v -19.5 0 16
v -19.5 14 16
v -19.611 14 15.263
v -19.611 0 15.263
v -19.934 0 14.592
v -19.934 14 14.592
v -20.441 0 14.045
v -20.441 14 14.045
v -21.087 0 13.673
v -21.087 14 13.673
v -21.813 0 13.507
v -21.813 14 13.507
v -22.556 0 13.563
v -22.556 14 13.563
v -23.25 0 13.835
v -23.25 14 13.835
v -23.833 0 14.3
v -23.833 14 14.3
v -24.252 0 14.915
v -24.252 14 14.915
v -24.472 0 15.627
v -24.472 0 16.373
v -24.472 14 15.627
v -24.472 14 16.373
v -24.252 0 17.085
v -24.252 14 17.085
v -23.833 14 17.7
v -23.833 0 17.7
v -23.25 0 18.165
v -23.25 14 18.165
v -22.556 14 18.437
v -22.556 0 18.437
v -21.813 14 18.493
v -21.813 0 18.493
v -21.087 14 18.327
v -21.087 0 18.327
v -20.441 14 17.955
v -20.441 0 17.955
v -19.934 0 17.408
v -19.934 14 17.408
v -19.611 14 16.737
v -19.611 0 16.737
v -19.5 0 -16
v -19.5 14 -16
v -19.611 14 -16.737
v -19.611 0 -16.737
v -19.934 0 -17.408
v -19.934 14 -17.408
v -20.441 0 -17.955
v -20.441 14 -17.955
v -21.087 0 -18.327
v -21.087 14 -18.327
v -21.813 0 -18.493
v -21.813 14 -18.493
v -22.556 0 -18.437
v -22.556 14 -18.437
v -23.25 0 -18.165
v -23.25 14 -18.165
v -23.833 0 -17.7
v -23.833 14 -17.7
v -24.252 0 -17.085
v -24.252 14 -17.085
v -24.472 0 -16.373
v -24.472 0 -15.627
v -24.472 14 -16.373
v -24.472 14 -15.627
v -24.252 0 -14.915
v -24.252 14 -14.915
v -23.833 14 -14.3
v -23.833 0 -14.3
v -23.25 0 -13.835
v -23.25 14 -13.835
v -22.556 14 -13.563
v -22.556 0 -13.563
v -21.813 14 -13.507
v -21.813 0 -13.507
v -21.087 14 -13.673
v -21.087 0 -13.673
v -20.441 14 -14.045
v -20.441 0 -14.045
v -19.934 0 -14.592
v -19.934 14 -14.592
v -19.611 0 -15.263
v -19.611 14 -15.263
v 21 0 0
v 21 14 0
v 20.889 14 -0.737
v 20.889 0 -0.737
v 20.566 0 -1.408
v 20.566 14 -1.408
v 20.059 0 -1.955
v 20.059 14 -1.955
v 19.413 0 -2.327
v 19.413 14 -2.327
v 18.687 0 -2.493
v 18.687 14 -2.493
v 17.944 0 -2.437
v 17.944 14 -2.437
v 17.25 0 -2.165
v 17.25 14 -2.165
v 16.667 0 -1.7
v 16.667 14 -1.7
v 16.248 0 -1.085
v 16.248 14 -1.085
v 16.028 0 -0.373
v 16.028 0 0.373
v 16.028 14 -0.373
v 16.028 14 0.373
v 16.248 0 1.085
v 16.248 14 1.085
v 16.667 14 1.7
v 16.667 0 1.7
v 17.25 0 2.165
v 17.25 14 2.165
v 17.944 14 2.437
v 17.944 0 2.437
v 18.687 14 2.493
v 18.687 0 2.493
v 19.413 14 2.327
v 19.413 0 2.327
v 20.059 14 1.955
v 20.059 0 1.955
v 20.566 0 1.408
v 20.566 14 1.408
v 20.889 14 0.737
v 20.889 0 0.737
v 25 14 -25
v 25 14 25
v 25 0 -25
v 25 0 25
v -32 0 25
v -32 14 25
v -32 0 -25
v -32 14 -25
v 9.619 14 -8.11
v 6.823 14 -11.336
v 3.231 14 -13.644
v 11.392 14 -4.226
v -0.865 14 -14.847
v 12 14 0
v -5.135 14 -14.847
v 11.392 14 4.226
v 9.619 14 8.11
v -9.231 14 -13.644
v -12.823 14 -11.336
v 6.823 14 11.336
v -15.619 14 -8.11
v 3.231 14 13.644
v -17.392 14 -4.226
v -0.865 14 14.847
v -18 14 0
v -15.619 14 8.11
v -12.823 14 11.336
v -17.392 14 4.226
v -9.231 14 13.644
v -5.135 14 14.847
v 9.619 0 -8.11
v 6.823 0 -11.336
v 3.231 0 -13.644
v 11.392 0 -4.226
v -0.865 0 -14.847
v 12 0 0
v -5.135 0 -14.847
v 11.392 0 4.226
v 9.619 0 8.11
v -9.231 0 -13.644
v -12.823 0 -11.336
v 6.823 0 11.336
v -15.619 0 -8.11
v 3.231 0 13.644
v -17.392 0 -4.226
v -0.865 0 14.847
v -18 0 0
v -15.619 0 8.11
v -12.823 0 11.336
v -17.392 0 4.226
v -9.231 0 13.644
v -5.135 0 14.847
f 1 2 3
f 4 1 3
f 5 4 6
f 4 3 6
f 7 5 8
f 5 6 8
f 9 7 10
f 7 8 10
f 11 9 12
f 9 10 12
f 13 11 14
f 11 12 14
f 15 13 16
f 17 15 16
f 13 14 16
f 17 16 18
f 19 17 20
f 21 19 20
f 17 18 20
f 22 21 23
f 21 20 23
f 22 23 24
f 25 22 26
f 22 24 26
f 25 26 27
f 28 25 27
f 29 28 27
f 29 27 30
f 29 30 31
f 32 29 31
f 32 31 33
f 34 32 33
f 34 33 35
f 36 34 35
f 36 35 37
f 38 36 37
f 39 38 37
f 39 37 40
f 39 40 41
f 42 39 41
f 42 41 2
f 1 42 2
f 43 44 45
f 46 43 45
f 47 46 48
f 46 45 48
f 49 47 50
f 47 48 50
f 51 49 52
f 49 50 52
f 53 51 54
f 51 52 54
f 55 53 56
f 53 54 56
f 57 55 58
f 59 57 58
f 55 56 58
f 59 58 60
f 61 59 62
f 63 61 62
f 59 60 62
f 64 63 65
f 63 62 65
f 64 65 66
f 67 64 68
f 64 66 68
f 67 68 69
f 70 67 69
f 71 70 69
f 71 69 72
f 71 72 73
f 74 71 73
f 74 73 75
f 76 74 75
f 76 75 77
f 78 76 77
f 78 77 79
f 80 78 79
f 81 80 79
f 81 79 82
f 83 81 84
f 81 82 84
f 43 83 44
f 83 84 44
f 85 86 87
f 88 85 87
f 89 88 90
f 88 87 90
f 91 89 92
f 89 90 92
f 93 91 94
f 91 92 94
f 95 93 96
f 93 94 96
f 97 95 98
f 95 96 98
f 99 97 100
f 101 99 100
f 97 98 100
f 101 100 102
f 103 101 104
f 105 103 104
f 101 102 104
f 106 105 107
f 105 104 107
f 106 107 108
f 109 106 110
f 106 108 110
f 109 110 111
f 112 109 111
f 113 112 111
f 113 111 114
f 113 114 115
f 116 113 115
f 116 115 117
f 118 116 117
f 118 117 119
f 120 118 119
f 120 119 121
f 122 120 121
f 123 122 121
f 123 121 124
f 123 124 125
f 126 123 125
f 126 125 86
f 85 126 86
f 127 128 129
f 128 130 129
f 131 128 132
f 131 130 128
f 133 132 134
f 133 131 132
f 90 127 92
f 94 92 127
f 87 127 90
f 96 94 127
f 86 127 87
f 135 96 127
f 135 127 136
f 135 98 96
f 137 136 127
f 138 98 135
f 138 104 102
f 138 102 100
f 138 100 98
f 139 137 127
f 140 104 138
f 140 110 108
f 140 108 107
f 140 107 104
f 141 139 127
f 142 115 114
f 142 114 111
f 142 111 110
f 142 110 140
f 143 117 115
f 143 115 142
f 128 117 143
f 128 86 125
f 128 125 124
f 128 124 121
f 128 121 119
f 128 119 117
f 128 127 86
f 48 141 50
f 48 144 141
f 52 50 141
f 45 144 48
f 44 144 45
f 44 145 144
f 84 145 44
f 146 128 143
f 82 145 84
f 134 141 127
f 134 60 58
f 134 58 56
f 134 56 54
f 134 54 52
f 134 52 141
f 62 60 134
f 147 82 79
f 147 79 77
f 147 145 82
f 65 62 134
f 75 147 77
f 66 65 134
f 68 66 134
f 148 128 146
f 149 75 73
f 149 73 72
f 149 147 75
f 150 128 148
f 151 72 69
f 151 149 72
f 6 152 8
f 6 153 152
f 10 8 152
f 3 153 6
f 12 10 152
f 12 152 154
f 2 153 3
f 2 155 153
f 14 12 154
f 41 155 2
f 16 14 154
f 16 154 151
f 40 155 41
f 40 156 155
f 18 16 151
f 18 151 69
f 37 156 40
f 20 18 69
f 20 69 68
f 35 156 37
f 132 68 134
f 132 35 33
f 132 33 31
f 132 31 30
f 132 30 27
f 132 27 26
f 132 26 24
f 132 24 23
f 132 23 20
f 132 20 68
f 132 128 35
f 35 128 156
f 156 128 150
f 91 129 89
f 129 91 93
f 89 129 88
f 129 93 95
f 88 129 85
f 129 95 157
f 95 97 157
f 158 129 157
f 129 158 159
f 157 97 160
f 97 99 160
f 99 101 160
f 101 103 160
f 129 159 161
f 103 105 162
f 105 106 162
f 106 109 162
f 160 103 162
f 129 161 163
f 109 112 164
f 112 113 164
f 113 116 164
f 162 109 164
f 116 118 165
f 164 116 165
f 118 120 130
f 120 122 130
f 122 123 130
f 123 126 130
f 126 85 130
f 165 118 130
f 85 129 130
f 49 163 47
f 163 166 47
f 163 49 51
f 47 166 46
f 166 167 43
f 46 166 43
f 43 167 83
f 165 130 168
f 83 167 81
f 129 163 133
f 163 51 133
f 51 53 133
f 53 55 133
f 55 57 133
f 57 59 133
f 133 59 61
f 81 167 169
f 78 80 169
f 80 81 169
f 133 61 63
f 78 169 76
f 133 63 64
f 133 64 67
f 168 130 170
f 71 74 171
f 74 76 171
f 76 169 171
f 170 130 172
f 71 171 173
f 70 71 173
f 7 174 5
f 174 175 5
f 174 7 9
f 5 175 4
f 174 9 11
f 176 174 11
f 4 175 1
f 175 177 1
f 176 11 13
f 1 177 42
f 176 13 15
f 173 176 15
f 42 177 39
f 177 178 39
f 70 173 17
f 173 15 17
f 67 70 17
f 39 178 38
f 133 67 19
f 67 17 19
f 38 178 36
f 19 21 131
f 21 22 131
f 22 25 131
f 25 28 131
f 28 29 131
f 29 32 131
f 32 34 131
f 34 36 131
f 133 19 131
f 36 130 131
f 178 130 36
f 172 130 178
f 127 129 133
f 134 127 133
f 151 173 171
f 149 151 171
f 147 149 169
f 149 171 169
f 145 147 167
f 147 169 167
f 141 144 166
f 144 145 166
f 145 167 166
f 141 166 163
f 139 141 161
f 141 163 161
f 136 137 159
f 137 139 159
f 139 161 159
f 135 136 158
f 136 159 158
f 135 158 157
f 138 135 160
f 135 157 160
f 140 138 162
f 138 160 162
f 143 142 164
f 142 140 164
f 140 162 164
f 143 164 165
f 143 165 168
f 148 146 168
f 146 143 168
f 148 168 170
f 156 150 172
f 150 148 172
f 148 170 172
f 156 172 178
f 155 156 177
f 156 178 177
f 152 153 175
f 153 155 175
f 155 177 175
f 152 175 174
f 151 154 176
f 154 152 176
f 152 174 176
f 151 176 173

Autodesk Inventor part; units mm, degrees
ref_plane "YZ Plane" through (0, 0, 0) normal (1, 0, 0) x (0, 1, 0)
ref_plane "XZ Plane" through (0, 0, 0) normal (0, 1, 0) x (-1, 0, 0)
ref_plane "XY Plane" through (0, 0, 0) normal (0, 0, 1) x (1, 0, 0)
sketch "Szkic1" plane through (0, 0, 0) normal (0, 1, 0) x (-1, 0, 0)
  circle A0 centre (3, 0) radius 15
  line L0 (32, -51.5) -> (19.7697, -51.5)
  arc A1 (19.7697, -48.5) -> (19.7697, -51.5) centre (15, -50) ccw
  line L1 (19.7697, -48.5) -> (32, -48.5)
  line L2 (32, 48.5) -> (32, -48.5)
  line L3 (32, 48.5) -> (19.7697, 48.5)
  arc A2 (19.7697, 51.5) -> (19.7697, 48.5) centre (15, 50) ccw
  line L4 (19.7697, 51.5) -> (32, 51.5)
  line L5 (32, 60) -> (32, 51.5)
  line L6 (32, 60) -> (-25, 60)
  line L7 (-25, 60) -> (-25, -60)
  line L8 (-25, -60) -> (32, -60)
  line L9 (32, -51.5) -> (32, -60)
  line L10 (-25, 0) -> (-25, -25)
  line L11 (-25, -25) -> (32, -25)
  line L12 (-25, 0) -> (-25, 25)
  line L13 (-25, 25) -> (32, 25)
  point P0 (0, 0)
  point P1 (0, 0)
  dimension "d0" = 25
  dimension "d1" = 25
extrude "Wyciągnięcie proste1" add sketch "Szkic1" along normal blind 14 contours L7 L13 L2 L11
sketch "Szkic2" plane through (0, 14, 0) normal (0, 1, 0) x (1, 0, 0)
  circle A0 centre (-3, 0) radius 15 projected
  line L0 (-32, 25) -> (-32, -25) projected
  line L1 (25, -25) -> (25, 25) projected
  line L2 (12, 0) -> (15, 0)
  line L3 (-18, 0) -> (-22, 0)
  line L4 (-22, 0) -> (-22, 16)
  line L5 (-22, 0) -> (-22, -16)
  circle A1 centre (-22, 16) radius 2.5
  circle A2 centre (-22, -16) radius 2.5
  line L6 (12, 0) -> (18.5, 0)
  circle A3 centre (18.5, 0) radius 2.5
  point P0 (0, 0)
  dimension "d11" = 10
  dimension "d12" = 5
  dimension "d13" = 5
  dimension "d18" = 6.5
  dimension "d19" = 5
extrude "Wyciągnięcie proste2" cut sketch "Szkic2" against normal up to next contours A2 | A1 | A3
properties part number "Uchwyt górnego łożyska osi Z"
